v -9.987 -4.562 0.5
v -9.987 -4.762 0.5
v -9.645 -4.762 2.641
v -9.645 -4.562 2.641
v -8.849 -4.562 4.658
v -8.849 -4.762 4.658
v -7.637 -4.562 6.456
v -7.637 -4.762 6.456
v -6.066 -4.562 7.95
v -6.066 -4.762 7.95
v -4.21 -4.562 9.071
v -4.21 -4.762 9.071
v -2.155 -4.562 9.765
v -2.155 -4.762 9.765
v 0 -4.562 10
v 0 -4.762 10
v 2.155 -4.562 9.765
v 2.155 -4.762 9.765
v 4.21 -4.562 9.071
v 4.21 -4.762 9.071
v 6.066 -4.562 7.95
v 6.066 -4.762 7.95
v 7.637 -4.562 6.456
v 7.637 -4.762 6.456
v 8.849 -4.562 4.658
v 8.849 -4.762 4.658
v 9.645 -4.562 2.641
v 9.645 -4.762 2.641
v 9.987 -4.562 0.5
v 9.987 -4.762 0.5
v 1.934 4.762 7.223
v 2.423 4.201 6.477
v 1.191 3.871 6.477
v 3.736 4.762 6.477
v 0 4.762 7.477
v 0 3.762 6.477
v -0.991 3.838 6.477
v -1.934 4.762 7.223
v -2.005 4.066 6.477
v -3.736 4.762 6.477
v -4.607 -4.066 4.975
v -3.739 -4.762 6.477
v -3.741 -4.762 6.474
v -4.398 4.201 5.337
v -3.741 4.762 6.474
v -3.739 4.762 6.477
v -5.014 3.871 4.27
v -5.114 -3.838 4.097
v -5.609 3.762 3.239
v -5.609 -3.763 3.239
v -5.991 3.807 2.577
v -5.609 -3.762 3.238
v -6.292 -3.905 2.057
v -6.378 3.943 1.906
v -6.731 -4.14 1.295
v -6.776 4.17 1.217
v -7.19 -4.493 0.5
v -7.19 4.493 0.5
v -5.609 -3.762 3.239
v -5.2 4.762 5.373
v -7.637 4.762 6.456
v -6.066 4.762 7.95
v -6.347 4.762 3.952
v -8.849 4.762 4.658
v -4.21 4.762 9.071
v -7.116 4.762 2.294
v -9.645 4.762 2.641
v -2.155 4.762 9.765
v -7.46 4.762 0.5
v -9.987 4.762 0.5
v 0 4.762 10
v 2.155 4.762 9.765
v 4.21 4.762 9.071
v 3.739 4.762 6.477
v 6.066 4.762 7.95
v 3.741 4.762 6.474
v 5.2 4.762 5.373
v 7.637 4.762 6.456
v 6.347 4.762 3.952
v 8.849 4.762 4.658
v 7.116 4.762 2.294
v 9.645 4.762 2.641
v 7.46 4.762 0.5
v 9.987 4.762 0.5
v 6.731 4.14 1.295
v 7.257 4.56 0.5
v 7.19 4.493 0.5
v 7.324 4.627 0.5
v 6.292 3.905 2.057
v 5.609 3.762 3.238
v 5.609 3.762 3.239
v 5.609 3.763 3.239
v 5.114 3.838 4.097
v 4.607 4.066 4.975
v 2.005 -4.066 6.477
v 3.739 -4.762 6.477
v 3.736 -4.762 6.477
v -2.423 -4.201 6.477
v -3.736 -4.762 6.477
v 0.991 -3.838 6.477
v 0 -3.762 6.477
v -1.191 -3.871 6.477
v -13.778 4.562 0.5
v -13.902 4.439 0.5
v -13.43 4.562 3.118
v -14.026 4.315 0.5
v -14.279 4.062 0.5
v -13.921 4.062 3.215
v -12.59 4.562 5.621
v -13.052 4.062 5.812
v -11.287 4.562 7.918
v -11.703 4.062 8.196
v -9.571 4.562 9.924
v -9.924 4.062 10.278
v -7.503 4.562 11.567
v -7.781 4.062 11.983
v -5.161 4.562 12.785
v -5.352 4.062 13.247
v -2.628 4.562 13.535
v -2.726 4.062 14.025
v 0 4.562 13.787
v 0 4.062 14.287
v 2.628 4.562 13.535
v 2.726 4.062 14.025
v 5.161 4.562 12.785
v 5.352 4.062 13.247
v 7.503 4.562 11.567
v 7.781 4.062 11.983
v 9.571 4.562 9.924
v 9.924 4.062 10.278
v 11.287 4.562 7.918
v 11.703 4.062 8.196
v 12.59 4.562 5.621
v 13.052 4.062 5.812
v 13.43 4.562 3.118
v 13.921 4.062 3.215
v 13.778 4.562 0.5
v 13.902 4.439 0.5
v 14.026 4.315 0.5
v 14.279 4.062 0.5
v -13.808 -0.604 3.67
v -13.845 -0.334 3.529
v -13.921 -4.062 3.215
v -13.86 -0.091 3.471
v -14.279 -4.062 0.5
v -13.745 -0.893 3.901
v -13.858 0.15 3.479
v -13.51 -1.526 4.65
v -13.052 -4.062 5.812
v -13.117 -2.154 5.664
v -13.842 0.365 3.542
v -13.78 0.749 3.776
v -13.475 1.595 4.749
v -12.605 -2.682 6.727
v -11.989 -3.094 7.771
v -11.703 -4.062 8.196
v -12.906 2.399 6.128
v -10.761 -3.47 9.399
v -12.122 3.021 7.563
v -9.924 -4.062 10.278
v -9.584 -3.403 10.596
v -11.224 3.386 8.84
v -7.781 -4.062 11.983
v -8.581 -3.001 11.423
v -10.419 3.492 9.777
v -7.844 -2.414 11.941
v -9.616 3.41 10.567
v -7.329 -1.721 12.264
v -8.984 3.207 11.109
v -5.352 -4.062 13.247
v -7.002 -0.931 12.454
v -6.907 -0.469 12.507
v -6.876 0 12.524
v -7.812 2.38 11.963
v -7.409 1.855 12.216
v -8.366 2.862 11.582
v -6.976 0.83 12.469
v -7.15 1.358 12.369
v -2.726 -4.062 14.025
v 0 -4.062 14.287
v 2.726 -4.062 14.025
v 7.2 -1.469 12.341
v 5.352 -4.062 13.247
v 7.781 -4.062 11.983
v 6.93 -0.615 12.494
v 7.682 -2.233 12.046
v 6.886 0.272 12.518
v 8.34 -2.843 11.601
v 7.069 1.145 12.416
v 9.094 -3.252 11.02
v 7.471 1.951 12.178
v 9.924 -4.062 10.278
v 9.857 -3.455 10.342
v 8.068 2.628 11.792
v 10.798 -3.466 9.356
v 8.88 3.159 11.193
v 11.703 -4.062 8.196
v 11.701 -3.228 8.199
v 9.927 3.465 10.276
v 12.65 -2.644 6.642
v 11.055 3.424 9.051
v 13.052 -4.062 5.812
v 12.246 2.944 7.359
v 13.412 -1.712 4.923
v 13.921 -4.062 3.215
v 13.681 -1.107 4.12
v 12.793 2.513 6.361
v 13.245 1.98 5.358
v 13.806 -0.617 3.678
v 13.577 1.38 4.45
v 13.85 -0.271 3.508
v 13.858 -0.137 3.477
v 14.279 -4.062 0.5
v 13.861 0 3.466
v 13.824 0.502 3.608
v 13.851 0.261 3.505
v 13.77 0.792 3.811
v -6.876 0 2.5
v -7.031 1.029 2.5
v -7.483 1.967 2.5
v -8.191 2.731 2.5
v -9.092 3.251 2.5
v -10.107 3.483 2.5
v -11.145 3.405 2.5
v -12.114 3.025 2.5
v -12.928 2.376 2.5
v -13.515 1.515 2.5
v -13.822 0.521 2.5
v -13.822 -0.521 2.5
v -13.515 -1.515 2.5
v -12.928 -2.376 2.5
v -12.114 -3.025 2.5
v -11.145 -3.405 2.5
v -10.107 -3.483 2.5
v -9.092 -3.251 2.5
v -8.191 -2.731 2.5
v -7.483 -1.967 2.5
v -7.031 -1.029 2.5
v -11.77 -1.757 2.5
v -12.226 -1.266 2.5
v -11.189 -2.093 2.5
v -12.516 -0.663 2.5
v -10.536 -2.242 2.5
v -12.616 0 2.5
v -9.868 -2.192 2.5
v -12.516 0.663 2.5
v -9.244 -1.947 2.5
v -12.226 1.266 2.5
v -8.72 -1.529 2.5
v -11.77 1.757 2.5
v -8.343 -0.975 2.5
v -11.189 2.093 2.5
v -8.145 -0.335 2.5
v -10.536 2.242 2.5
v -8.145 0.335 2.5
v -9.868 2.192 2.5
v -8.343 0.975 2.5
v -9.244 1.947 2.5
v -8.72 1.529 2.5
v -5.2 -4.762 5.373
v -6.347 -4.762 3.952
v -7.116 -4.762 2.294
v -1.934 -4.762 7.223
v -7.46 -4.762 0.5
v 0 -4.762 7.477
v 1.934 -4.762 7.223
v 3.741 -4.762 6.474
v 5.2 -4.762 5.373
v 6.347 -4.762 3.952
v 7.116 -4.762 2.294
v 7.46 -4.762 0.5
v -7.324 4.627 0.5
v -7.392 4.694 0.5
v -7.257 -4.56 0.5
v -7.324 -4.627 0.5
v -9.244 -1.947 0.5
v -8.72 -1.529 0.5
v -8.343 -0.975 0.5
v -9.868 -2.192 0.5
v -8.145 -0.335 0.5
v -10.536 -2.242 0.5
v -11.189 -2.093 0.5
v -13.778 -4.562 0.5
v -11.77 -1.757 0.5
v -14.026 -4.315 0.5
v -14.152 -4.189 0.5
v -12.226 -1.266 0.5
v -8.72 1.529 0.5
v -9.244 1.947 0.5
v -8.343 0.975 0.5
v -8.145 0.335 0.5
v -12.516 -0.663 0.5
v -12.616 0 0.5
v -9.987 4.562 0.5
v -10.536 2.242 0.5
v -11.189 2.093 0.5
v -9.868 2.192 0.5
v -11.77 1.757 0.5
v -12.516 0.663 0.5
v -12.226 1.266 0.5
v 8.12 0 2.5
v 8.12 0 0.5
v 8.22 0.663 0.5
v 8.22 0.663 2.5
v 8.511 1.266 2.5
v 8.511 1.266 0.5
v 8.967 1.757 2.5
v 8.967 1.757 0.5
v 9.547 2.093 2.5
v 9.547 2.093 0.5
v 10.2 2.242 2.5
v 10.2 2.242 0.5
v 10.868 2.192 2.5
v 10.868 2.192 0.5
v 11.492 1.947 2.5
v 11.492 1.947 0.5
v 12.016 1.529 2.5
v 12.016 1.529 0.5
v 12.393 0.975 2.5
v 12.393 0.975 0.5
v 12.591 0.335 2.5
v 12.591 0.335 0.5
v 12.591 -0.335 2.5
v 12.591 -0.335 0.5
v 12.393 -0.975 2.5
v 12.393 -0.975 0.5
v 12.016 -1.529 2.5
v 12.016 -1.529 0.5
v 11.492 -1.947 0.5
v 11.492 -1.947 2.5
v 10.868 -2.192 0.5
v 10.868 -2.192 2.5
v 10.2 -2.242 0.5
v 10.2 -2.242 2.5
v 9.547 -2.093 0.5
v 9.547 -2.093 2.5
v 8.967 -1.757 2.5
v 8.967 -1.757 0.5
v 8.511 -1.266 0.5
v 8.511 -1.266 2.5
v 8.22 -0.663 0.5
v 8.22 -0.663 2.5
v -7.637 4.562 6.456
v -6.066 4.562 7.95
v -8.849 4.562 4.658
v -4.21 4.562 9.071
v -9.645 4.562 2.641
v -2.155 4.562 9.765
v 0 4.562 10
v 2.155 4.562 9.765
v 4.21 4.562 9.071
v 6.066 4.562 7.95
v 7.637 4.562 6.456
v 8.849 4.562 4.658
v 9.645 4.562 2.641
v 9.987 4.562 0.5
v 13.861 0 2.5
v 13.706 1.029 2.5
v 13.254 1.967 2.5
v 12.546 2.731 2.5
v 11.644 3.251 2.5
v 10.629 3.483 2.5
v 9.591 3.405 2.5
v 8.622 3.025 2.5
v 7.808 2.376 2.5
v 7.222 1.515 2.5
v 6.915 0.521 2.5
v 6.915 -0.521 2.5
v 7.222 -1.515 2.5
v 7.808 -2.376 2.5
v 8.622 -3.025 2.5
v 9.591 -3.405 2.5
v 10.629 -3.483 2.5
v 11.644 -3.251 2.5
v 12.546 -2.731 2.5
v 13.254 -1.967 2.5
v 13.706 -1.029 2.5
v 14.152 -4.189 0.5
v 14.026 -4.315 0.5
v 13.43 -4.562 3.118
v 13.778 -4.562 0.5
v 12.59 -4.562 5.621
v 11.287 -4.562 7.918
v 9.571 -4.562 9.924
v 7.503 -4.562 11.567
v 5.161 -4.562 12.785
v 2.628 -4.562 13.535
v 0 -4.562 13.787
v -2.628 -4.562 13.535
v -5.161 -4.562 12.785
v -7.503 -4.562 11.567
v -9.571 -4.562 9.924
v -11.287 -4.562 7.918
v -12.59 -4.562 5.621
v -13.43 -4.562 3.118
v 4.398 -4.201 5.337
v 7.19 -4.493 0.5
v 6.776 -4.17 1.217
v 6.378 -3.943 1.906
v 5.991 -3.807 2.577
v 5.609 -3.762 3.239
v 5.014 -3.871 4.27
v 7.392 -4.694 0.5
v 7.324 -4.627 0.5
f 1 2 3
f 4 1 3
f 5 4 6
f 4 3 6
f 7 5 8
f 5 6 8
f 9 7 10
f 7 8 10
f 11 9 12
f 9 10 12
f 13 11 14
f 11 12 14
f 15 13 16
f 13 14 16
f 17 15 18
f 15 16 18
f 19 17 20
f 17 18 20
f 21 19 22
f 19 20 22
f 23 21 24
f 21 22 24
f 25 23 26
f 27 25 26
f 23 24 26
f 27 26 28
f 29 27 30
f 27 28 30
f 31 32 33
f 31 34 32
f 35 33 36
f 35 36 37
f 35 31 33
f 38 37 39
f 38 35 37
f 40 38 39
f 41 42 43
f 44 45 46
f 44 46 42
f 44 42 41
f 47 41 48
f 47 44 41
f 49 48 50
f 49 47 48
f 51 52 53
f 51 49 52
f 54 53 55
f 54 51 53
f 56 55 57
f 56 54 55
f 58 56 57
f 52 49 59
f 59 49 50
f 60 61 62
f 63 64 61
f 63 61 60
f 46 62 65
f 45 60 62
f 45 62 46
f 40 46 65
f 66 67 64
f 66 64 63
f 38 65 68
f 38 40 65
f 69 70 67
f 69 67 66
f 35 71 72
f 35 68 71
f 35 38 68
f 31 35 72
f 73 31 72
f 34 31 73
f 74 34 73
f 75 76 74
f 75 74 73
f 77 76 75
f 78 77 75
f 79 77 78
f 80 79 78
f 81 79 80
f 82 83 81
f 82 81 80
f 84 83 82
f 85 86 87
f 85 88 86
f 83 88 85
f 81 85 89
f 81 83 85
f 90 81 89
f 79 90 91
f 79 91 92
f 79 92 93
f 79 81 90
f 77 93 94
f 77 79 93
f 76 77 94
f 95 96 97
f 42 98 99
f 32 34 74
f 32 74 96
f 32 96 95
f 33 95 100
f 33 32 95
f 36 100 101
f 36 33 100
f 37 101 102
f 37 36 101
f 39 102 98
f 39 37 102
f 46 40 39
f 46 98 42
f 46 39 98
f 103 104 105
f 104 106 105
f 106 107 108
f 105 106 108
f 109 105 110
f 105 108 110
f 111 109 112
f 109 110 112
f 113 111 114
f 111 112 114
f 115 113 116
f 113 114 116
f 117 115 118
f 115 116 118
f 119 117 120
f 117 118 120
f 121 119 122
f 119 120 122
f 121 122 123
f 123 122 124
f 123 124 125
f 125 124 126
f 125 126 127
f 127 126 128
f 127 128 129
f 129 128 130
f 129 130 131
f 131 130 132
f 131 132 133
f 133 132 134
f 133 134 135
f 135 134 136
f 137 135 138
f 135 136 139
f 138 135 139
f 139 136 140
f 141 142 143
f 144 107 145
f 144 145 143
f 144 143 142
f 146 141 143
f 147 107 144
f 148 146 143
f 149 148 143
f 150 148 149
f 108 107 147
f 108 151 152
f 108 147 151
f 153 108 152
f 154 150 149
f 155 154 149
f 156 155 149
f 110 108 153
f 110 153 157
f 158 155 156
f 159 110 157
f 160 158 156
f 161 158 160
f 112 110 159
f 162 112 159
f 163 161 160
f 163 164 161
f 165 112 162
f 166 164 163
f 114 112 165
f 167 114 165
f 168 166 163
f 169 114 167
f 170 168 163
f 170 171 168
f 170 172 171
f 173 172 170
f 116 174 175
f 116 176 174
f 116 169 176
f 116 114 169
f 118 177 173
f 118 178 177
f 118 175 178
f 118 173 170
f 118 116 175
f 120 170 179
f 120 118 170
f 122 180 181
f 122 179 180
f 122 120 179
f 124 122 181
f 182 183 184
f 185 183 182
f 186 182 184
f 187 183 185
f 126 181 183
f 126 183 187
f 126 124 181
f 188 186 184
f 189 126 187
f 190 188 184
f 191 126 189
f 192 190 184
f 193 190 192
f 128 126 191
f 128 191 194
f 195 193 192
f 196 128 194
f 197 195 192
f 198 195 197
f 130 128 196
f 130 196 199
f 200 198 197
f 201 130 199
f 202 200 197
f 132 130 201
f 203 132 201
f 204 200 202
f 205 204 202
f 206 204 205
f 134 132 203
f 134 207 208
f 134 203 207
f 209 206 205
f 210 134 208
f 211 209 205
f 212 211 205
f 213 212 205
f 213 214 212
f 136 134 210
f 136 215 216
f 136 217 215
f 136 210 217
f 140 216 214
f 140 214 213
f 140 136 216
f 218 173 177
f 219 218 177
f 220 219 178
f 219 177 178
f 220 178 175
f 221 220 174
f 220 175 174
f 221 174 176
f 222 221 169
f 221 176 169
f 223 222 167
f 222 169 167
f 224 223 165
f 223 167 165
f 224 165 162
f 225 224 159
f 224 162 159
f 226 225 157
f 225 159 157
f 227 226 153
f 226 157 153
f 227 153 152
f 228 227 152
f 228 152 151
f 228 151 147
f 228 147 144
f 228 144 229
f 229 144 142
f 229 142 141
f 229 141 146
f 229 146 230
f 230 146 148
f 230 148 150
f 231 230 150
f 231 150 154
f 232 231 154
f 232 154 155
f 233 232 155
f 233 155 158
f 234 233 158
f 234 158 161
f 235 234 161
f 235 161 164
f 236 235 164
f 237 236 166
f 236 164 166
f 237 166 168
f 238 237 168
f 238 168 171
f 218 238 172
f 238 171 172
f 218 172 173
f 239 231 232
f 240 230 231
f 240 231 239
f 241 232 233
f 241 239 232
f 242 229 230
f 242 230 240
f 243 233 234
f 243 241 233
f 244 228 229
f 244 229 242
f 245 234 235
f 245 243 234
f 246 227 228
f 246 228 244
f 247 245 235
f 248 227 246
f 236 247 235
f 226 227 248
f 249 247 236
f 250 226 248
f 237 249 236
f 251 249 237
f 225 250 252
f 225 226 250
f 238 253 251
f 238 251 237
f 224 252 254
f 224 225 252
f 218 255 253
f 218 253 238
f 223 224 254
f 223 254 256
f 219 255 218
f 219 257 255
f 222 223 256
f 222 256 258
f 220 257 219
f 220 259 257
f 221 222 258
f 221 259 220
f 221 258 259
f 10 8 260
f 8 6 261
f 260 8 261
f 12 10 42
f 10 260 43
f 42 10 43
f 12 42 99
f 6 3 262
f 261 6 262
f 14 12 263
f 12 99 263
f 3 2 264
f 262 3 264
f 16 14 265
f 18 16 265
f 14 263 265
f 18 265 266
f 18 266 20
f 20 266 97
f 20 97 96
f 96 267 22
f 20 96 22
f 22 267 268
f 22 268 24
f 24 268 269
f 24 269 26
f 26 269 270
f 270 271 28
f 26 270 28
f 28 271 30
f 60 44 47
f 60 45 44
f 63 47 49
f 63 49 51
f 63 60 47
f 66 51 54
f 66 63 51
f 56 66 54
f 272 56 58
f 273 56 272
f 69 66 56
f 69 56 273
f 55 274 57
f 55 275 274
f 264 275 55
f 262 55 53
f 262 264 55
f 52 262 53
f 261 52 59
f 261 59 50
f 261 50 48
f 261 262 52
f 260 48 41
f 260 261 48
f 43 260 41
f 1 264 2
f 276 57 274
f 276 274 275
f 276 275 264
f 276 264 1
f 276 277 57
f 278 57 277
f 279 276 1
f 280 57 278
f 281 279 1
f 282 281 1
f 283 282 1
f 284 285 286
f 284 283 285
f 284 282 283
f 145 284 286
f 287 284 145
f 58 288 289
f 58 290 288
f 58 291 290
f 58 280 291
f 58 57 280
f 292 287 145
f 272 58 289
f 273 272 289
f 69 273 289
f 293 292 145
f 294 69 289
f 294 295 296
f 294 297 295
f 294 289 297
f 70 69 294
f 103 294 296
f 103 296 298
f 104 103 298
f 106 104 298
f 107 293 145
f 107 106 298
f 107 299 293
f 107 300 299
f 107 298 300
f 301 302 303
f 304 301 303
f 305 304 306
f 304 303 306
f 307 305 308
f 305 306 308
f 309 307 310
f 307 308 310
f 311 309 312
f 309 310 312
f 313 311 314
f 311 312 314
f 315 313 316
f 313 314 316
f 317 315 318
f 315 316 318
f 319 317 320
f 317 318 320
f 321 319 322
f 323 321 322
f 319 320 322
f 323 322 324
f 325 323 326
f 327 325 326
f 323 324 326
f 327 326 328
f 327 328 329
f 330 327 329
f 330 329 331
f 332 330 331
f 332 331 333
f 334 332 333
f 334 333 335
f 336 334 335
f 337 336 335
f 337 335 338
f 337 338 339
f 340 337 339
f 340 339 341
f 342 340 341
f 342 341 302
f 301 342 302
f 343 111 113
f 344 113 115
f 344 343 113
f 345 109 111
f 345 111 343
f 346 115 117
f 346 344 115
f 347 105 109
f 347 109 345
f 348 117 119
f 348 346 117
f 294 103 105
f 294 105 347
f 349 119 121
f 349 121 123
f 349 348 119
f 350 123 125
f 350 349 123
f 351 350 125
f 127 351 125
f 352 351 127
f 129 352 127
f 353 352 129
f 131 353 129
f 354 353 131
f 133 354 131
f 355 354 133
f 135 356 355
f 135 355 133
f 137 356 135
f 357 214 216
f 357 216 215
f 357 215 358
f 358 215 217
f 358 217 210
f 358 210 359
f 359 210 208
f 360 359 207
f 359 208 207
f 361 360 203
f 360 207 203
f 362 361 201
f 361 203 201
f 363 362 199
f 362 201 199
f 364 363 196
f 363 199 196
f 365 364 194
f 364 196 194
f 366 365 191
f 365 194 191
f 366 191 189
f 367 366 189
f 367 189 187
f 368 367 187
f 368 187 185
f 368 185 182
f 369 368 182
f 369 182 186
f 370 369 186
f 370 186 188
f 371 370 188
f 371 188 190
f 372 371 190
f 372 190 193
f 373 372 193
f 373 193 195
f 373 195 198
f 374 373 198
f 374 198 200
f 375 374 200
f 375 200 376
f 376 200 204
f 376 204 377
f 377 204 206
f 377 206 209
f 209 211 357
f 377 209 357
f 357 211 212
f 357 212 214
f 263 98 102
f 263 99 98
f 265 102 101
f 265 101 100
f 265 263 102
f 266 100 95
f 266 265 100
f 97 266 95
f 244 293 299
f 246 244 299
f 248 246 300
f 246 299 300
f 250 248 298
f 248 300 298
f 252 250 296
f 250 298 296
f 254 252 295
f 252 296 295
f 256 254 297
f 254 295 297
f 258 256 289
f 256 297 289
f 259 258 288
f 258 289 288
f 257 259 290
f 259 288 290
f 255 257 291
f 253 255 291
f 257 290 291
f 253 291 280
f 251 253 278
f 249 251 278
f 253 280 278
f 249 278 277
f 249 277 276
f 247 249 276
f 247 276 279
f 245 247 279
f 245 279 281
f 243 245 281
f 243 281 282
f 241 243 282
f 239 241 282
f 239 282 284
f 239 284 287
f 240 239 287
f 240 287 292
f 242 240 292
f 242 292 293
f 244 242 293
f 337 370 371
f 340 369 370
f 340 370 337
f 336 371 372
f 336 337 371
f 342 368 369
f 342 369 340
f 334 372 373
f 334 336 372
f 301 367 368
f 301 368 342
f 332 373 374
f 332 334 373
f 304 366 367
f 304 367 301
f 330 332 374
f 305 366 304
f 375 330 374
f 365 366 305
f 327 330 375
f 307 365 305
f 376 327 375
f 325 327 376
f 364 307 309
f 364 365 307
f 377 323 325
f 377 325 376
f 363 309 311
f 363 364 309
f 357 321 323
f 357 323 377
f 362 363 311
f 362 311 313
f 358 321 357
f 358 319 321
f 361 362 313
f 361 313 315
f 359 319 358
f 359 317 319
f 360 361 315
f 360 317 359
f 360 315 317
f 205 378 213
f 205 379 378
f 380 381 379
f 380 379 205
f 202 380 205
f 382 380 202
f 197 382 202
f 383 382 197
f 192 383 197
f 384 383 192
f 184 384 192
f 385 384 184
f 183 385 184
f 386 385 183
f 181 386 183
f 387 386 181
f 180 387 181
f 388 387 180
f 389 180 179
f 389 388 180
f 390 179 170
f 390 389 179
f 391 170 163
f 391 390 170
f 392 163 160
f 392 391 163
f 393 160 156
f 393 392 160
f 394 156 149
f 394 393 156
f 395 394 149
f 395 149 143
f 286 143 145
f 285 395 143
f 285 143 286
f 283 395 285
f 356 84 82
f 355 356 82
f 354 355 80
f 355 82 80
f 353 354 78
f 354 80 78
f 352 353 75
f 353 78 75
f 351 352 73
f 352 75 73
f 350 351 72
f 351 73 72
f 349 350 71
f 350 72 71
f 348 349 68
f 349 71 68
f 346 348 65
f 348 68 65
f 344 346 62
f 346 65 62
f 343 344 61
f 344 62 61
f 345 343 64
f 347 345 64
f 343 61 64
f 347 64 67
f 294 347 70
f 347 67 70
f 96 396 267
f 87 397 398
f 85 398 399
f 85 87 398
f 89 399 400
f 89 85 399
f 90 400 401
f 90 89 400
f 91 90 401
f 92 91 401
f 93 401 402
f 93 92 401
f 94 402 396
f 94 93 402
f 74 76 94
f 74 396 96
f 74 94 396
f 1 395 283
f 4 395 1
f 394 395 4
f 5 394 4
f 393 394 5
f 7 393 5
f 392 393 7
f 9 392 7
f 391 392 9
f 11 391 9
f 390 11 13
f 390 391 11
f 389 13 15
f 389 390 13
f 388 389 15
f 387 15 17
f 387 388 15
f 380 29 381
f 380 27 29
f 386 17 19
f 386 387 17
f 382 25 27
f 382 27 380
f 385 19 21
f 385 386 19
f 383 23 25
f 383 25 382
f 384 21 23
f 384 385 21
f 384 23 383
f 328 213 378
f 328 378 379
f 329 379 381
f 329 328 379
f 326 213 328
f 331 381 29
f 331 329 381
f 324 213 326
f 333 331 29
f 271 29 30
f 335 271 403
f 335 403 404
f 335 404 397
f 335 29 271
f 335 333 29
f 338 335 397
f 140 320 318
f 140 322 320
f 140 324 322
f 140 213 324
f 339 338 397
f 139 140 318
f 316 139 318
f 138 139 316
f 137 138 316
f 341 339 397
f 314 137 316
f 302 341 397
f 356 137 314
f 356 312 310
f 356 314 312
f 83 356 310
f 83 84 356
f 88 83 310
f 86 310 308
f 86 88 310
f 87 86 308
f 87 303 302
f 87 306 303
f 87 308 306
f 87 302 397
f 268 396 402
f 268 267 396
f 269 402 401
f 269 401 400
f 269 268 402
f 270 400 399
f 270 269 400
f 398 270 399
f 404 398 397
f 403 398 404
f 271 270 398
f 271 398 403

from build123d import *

# Parameters (mm, degrees)
BOSS_EXTRUDE1_DEPTH                                 = 9.525
CUT_EXTRUDE7_DEPTH                                  = 0.2
CUT_EXTRUDE8_DEPTH                                  = 0.2
CBORE_FOR_8_BINDING_HEAD_MACHINE_SCREW4_D           = 4.4958
CBORE_FOR_8_BINDING_HEAD_MACHINE_SCREW4_DEPTH       = 12.024265282
CBORE_FOR_8_BINDING_HEAD_MACHINE_SCREW4_CBORE_D     = 6.985
CBORE_FOR_8_BINDING_HEAD_MACHINE_SCREW4_CBORE_DEPTH = 10.024265282
CHAMFER4_SIZE                                       = 0.5


with BuildPart() as part:
    # Sketch32 → Boss-Extrude1 (new body)
    with BuildSketch(Plane(origin=(0, 4.7625, 0), x_dir=(1, 0, 0), z_dir=(0, 1, 0))):
        with BuildLine():
            Line((14.278748413, -0.5), (7.190320252, -0.5))
            Line((7.190320252, -0.5), (3.739497694, -6.477))
            Line((3.739497694, -6.477), (-3.739497694, -6.477))
            Line((-3.739497694, -6.477), (-7.190320252, -0.5))
            Line((-7.190320252, -0.5), (-14.278748413, -0.5))
            ThreePointArc((-14.278748413, -0.5), (0, -14.2875), (14.278748413, -0.5))
        make_face()
    extrude(amount=-BOSS_EXTRUDE1_DEPTH)

    # Sketch37 → Cut-Revolve4 (revolve, cut)
    with BuildSketch(Plane(origin=(0, 0, 0), x_dir=(-0.99776158, 0, -0.06687174), z_dir=(0.06687174, 0, -0.99776158))):
        Polygon((0, -4.7625), (0, -3.7625), (-6.477, -3.7625), (-7.477, -4.7625), align=None)
    revolve(axis=Axis((0, -4.7625, 0), (0, 1, 0)), mode=Mode.SUBTRACT)

    # Sketch43 → Cut-Revolve5 (revolve, cut)
    with BuildSketch(Plane(origin=(0, 0, 0), x_dir=(-0.99776158, 0, 0.06687174), z_dir=(-0.06687174, 0, -0.99776158))):
        Polygon((0, 4.7625), (0, 3.7625), (6.477, 3.7625), (7.477, 4.7625), align=None)
    revolve(axis=Axis((0, 4.7625, 0), (0, -1, 0)), mode=Mode.SUBTRACT)

    # Sketch48 → Cut-Extrude7 (cut)
    with BuildSketch(Plane(origin=(0, 4.7625, 0), x_dir=(1, 0, 0), z_dir=(0, 1, 0))):
        with BuildLine():
            Line((14.278748413, -0.5), (9.987492178, -0.5))
            ThreePointArc((9.987492178, -0.5), (0, -10), (-9.987492178, -0.5))
            Line((-9.987492178, -0.5), (-14.278748413, -0.5))
            ThreePointArc((-14.278748413, -0.5), (0, -14.2875), (14.278748413, -0.5))
        make_face()
    extrude(amount=-CUT_EXTRUDE7_DEPTH, mode=Mode.SUBTRACT)

    # Sketch49 → Cut-Extrude8 (cut)
    with BuildSketch(Plane.XZ.offset(4.7625)):
        with BuildLine():
            Line((9.987492178, 0.5), (14.278748413, 0.5))
            ThreePointArc((14.278748413, 0.5), (0, 14.2875), (-14.278748413, 0.5))
            Line((-14.278748413, 0.5), (-9.987492178, 0.5))
            ThreePointArc((-9.987492178, 0.5), (0, 10), (9.987492178, 0.5))
        make_face()
    extrude(amount=-CUT_EXTRUDE8_DEPTH, mode=Mode.SUBTRACT)

    # CBORE for #8 Binding Head Machine Screw4
    with Locations(Plane.XY.offset(12.524265282)):
        with Locations((-10.368210259, 0), (10.368210259, 0)):
            CounterBoreHole(CBORE_FOR_8_BINDING_HEAD_MACHINE_SCREW4_D / 2, CBORE_FOR_8_BINDING_HEAD_MACHINE_SCREW4_CBORE_D / 2, CBORE_FOR_8_BINDING_HEAD_MACHINE_SCREW4_CBORE_DEPTH, depth=CBORE_FOR_8_BINDING_HEAD_MACHINE_SCREW4_DEPTH)

    # Chamfer4
    chamfer4_edges = [part.edges().sort_by_distance(p)[0] for p in [
        (0, 4.5625, 14.2875),
        (0, -4.5625, 14.2875),
    ]]
    chamfer(chamfer4_edges, length=CHAMFER4_SIZE)


solid = part.part
